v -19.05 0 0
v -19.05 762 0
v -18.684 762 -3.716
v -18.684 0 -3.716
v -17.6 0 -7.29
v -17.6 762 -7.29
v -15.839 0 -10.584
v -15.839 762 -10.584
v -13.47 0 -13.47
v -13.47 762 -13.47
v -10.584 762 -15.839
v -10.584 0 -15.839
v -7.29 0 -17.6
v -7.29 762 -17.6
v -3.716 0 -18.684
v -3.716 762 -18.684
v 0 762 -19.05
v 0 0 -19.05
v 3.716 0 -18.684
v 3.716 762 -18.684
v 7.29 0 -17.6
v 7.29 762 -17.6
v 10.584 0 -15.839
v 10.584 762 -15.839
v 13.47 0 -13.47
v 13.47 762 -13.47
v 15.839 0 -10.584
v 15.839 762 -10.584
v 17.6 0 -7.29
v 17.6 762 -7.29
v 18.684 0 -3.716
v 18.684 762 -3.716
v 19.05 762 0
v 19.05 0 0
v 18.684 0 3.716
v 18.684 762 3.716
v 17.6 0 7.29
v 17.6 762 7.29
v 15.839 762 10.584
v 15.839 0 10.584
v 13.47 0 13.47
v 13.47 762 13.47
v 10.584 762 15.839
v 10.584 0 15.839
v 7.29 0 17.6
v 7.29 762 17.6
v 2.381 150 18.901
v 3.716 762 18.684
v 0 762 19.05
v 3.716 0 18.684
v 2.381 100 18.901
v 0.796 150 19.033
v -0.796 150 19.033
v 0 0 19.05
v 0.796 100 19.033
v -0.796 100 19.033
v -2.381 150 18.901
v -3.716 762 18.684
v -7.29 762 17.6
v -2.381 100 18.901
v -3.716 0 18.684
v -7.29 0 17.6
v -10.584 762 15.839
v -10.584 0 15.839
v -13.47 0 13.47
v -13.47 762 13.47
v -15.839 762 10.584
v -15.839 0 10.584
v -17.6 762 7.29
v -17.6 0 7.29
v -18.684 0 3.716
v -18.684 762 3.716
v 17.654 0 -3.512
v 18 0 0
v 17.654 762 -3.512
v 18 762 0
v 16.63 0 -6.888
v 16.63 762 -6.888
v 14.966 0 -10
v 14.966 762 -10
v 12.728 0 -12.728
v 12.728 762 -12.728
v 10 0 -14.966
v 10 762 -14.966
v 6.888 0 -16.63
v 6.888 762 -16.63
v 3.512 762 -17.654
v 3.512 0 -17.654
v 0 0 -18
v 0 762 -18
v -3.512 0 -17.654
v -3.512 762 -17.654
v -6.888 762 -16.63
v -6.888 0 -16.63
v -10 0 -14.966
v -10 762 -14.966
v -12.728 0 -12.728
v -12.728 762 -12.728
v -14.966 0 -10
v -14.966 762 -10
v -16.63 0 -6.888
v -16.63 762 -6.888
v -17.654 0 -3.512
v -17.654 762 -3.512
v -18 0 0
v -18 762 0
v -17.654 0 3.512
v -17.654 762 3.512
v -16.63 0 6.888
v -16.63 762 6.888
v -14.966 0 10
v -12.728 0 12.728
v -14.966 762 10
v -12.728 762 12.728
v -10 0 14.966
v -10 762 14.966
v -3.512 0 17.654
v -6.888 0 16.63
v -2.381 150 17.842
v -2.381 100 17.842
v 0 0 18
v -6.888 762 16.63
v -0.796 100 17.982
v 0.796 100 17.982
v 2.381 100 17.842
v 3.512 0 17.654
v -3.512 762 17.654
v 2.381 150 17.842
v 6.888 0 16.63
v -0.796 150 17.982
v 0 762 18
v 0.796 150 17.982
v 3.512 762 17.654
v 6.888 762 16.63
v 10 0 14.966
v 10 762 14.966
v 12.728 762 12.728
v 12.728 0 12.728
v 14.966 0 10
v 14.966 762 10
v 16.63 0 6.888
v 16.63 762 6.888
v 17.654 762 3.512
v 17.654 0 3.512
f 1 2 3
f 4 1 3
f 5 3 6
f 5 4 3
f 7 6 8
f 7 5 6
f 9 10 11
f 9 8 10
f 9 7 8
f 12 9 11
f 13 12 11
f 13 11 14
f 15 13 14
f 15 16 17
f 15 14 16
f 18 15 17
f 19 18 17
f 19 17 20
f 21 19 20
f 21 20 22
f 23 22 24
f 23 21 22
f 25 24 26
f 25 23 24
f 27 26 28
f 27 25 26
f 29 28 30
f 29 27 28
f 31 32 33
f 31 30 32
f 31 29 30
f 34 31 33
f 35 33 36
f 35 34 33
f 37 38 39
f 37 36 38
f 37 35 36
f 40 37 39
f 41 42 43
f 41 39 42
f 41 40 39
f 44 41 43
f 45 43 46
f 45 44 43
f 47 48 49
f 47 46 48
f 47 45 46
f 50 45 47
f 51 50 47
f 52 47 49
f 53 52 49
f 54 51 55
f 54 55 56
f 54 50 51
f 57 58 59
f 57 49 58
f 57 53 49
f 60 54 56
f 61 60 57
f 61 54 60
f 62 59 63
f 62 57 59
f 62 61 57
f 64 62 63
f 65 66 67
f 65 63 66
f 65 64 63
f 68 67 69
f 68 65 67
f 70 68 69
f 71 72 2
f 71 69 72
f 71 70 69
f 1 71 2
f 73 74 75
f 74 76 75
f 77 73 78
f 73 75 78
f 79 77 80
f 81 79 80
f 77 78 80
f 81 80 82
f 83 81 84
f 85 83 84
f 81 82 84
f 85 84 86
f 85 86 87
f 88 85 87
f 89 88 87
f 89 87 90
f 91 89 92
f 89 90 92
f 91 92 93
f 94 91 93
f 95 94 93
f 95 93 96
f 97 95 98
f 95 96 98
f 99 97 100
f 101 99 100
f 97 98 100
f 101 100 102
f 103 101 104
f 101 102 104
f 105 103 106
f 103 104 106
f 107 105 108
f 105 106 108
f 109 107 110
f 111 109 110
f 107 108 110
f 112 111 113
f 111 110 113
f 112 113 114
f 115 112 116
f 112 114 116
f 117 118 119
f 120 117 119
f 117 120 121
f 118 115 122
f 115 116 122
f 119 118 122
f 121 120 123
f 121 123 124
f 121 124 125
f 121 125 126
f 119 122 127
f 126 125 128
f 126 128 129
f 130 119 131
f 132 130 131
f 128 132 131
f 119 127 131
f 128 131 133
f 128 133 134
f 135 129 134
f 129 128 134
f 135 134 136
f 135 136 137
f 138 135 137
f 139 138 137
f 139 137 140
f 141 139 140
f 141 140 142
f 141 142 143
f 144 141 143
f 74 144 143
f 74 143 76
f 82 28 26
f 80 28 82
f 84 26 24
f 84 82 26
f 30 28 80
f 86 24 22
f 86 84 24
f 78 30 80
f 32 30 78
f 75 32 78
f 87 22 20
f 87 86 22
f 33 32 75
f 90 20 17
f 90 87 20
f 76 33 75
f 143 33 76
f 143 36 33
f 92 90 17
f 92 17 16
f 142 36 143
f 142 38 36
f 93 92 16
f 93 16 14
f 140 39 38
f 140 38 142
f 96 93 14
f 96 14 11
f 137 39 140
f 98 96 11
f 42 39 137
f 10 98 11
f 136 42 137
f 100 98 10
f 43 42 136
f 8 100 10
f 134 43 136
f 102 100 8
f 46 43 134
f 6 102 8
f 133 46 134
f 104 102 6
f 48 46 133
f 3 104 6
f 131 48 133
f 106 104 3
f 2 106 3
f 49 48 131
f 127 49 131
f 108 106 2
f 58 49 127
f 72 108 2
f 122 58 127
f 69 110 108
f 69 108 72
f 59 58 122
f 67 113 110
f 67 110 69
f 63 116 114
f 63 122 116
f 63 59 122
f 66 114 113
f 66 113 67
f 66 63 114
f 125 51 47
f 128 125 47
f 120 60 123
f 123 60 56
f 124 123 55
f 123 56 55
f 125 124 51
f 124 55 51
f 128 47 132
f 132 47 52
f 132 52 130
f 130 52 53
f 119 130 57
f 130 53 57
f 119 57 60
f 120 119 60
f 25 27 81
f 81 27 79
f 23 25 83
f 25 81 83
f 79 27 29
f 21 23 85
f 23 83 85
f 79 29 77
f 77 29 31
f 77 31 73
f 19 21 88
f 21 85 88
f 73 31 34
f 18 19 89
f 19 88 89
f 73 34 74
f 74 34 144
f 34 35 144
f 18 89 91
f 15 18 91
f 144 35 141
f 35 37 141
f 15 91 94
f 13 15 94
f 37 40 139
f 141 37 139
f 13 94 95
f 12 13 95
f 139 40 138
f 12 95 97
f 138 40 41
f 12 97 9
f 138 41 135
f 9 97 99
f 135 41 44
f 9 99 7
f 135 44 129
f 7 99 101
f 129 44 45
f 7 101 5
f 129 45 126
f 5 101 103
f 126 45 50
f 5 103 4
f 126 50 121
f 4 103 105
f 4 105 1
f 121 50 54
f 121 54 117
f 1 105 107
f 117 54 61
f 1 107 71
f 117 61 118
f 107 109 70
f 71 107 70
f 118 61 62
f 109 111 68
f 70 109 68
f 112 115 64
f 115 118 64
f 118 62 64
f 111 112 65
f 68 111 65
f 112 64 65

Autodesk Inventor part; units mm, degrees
ref_plane "YZ Plane" through (0, 0, 0) normal (1, 0, 0) x (0, 1, 0)
ref_plane "XZ Plane" through (0, 0, 0) normal (0, 1, 0) x (-1, 0, 0)
sketch "Sketch1" plane through (0, 0, 0) normal (0, 1, 0) x (-1, 0, 0)
  circle A0 centre (0, 0) radius 19.05
  dimension "d0" = 38.1
extrude "Extrusion1" add sketch "Sketch1" along normal blind 762
sketch "Sketch2" plane through (0, 762, 0) normal (0, 1, 0) x (1, 0, 0)
  circle A0 centre (0, 0) radius 18
  dimension "d3" = 36
extrude "Extrusion2" cut sketch "Sketch2" along normal through all both and the other way through all
ref_plane "Work Plane1" through (0, 0, 29.95) normal (0, 0, 1) x (1, 0, 0)
sketch "Sketch3" plane through (0, 0, 29.95) normal (0, 0, 1) x (1, 0, 0)
  line L0 (0, 0) -> (0, 100)
  line L1 (-18, 100) -> (18, 100) projected
  line L2 (-2.3812, 100) -> (2.3812, 100)
  line L3 (2.3812, 100) -> (2.3813, 150)
  line L4 (2.3813, 150) -> (-2.3812, 150)
  line L5 (-2.3812, 150) -> (-2.3812, 100)
  dimension "d15" = 4.7625
  dimension "d16" = 50
extrude "Extrusion3" cut sketch "Sketch3" against normal blind 29.95
sketch "Sketch4" plane through (0, 0, 0) normal (0, -1, 0) x (1, 0, 0)
  circle A0 centre (0, 0) radius 19
  circle A1 centre (0, 0) radius 29.95
  dimension "d11" = 38
properties part number "Shaft connecting chassis updated 1-19"
